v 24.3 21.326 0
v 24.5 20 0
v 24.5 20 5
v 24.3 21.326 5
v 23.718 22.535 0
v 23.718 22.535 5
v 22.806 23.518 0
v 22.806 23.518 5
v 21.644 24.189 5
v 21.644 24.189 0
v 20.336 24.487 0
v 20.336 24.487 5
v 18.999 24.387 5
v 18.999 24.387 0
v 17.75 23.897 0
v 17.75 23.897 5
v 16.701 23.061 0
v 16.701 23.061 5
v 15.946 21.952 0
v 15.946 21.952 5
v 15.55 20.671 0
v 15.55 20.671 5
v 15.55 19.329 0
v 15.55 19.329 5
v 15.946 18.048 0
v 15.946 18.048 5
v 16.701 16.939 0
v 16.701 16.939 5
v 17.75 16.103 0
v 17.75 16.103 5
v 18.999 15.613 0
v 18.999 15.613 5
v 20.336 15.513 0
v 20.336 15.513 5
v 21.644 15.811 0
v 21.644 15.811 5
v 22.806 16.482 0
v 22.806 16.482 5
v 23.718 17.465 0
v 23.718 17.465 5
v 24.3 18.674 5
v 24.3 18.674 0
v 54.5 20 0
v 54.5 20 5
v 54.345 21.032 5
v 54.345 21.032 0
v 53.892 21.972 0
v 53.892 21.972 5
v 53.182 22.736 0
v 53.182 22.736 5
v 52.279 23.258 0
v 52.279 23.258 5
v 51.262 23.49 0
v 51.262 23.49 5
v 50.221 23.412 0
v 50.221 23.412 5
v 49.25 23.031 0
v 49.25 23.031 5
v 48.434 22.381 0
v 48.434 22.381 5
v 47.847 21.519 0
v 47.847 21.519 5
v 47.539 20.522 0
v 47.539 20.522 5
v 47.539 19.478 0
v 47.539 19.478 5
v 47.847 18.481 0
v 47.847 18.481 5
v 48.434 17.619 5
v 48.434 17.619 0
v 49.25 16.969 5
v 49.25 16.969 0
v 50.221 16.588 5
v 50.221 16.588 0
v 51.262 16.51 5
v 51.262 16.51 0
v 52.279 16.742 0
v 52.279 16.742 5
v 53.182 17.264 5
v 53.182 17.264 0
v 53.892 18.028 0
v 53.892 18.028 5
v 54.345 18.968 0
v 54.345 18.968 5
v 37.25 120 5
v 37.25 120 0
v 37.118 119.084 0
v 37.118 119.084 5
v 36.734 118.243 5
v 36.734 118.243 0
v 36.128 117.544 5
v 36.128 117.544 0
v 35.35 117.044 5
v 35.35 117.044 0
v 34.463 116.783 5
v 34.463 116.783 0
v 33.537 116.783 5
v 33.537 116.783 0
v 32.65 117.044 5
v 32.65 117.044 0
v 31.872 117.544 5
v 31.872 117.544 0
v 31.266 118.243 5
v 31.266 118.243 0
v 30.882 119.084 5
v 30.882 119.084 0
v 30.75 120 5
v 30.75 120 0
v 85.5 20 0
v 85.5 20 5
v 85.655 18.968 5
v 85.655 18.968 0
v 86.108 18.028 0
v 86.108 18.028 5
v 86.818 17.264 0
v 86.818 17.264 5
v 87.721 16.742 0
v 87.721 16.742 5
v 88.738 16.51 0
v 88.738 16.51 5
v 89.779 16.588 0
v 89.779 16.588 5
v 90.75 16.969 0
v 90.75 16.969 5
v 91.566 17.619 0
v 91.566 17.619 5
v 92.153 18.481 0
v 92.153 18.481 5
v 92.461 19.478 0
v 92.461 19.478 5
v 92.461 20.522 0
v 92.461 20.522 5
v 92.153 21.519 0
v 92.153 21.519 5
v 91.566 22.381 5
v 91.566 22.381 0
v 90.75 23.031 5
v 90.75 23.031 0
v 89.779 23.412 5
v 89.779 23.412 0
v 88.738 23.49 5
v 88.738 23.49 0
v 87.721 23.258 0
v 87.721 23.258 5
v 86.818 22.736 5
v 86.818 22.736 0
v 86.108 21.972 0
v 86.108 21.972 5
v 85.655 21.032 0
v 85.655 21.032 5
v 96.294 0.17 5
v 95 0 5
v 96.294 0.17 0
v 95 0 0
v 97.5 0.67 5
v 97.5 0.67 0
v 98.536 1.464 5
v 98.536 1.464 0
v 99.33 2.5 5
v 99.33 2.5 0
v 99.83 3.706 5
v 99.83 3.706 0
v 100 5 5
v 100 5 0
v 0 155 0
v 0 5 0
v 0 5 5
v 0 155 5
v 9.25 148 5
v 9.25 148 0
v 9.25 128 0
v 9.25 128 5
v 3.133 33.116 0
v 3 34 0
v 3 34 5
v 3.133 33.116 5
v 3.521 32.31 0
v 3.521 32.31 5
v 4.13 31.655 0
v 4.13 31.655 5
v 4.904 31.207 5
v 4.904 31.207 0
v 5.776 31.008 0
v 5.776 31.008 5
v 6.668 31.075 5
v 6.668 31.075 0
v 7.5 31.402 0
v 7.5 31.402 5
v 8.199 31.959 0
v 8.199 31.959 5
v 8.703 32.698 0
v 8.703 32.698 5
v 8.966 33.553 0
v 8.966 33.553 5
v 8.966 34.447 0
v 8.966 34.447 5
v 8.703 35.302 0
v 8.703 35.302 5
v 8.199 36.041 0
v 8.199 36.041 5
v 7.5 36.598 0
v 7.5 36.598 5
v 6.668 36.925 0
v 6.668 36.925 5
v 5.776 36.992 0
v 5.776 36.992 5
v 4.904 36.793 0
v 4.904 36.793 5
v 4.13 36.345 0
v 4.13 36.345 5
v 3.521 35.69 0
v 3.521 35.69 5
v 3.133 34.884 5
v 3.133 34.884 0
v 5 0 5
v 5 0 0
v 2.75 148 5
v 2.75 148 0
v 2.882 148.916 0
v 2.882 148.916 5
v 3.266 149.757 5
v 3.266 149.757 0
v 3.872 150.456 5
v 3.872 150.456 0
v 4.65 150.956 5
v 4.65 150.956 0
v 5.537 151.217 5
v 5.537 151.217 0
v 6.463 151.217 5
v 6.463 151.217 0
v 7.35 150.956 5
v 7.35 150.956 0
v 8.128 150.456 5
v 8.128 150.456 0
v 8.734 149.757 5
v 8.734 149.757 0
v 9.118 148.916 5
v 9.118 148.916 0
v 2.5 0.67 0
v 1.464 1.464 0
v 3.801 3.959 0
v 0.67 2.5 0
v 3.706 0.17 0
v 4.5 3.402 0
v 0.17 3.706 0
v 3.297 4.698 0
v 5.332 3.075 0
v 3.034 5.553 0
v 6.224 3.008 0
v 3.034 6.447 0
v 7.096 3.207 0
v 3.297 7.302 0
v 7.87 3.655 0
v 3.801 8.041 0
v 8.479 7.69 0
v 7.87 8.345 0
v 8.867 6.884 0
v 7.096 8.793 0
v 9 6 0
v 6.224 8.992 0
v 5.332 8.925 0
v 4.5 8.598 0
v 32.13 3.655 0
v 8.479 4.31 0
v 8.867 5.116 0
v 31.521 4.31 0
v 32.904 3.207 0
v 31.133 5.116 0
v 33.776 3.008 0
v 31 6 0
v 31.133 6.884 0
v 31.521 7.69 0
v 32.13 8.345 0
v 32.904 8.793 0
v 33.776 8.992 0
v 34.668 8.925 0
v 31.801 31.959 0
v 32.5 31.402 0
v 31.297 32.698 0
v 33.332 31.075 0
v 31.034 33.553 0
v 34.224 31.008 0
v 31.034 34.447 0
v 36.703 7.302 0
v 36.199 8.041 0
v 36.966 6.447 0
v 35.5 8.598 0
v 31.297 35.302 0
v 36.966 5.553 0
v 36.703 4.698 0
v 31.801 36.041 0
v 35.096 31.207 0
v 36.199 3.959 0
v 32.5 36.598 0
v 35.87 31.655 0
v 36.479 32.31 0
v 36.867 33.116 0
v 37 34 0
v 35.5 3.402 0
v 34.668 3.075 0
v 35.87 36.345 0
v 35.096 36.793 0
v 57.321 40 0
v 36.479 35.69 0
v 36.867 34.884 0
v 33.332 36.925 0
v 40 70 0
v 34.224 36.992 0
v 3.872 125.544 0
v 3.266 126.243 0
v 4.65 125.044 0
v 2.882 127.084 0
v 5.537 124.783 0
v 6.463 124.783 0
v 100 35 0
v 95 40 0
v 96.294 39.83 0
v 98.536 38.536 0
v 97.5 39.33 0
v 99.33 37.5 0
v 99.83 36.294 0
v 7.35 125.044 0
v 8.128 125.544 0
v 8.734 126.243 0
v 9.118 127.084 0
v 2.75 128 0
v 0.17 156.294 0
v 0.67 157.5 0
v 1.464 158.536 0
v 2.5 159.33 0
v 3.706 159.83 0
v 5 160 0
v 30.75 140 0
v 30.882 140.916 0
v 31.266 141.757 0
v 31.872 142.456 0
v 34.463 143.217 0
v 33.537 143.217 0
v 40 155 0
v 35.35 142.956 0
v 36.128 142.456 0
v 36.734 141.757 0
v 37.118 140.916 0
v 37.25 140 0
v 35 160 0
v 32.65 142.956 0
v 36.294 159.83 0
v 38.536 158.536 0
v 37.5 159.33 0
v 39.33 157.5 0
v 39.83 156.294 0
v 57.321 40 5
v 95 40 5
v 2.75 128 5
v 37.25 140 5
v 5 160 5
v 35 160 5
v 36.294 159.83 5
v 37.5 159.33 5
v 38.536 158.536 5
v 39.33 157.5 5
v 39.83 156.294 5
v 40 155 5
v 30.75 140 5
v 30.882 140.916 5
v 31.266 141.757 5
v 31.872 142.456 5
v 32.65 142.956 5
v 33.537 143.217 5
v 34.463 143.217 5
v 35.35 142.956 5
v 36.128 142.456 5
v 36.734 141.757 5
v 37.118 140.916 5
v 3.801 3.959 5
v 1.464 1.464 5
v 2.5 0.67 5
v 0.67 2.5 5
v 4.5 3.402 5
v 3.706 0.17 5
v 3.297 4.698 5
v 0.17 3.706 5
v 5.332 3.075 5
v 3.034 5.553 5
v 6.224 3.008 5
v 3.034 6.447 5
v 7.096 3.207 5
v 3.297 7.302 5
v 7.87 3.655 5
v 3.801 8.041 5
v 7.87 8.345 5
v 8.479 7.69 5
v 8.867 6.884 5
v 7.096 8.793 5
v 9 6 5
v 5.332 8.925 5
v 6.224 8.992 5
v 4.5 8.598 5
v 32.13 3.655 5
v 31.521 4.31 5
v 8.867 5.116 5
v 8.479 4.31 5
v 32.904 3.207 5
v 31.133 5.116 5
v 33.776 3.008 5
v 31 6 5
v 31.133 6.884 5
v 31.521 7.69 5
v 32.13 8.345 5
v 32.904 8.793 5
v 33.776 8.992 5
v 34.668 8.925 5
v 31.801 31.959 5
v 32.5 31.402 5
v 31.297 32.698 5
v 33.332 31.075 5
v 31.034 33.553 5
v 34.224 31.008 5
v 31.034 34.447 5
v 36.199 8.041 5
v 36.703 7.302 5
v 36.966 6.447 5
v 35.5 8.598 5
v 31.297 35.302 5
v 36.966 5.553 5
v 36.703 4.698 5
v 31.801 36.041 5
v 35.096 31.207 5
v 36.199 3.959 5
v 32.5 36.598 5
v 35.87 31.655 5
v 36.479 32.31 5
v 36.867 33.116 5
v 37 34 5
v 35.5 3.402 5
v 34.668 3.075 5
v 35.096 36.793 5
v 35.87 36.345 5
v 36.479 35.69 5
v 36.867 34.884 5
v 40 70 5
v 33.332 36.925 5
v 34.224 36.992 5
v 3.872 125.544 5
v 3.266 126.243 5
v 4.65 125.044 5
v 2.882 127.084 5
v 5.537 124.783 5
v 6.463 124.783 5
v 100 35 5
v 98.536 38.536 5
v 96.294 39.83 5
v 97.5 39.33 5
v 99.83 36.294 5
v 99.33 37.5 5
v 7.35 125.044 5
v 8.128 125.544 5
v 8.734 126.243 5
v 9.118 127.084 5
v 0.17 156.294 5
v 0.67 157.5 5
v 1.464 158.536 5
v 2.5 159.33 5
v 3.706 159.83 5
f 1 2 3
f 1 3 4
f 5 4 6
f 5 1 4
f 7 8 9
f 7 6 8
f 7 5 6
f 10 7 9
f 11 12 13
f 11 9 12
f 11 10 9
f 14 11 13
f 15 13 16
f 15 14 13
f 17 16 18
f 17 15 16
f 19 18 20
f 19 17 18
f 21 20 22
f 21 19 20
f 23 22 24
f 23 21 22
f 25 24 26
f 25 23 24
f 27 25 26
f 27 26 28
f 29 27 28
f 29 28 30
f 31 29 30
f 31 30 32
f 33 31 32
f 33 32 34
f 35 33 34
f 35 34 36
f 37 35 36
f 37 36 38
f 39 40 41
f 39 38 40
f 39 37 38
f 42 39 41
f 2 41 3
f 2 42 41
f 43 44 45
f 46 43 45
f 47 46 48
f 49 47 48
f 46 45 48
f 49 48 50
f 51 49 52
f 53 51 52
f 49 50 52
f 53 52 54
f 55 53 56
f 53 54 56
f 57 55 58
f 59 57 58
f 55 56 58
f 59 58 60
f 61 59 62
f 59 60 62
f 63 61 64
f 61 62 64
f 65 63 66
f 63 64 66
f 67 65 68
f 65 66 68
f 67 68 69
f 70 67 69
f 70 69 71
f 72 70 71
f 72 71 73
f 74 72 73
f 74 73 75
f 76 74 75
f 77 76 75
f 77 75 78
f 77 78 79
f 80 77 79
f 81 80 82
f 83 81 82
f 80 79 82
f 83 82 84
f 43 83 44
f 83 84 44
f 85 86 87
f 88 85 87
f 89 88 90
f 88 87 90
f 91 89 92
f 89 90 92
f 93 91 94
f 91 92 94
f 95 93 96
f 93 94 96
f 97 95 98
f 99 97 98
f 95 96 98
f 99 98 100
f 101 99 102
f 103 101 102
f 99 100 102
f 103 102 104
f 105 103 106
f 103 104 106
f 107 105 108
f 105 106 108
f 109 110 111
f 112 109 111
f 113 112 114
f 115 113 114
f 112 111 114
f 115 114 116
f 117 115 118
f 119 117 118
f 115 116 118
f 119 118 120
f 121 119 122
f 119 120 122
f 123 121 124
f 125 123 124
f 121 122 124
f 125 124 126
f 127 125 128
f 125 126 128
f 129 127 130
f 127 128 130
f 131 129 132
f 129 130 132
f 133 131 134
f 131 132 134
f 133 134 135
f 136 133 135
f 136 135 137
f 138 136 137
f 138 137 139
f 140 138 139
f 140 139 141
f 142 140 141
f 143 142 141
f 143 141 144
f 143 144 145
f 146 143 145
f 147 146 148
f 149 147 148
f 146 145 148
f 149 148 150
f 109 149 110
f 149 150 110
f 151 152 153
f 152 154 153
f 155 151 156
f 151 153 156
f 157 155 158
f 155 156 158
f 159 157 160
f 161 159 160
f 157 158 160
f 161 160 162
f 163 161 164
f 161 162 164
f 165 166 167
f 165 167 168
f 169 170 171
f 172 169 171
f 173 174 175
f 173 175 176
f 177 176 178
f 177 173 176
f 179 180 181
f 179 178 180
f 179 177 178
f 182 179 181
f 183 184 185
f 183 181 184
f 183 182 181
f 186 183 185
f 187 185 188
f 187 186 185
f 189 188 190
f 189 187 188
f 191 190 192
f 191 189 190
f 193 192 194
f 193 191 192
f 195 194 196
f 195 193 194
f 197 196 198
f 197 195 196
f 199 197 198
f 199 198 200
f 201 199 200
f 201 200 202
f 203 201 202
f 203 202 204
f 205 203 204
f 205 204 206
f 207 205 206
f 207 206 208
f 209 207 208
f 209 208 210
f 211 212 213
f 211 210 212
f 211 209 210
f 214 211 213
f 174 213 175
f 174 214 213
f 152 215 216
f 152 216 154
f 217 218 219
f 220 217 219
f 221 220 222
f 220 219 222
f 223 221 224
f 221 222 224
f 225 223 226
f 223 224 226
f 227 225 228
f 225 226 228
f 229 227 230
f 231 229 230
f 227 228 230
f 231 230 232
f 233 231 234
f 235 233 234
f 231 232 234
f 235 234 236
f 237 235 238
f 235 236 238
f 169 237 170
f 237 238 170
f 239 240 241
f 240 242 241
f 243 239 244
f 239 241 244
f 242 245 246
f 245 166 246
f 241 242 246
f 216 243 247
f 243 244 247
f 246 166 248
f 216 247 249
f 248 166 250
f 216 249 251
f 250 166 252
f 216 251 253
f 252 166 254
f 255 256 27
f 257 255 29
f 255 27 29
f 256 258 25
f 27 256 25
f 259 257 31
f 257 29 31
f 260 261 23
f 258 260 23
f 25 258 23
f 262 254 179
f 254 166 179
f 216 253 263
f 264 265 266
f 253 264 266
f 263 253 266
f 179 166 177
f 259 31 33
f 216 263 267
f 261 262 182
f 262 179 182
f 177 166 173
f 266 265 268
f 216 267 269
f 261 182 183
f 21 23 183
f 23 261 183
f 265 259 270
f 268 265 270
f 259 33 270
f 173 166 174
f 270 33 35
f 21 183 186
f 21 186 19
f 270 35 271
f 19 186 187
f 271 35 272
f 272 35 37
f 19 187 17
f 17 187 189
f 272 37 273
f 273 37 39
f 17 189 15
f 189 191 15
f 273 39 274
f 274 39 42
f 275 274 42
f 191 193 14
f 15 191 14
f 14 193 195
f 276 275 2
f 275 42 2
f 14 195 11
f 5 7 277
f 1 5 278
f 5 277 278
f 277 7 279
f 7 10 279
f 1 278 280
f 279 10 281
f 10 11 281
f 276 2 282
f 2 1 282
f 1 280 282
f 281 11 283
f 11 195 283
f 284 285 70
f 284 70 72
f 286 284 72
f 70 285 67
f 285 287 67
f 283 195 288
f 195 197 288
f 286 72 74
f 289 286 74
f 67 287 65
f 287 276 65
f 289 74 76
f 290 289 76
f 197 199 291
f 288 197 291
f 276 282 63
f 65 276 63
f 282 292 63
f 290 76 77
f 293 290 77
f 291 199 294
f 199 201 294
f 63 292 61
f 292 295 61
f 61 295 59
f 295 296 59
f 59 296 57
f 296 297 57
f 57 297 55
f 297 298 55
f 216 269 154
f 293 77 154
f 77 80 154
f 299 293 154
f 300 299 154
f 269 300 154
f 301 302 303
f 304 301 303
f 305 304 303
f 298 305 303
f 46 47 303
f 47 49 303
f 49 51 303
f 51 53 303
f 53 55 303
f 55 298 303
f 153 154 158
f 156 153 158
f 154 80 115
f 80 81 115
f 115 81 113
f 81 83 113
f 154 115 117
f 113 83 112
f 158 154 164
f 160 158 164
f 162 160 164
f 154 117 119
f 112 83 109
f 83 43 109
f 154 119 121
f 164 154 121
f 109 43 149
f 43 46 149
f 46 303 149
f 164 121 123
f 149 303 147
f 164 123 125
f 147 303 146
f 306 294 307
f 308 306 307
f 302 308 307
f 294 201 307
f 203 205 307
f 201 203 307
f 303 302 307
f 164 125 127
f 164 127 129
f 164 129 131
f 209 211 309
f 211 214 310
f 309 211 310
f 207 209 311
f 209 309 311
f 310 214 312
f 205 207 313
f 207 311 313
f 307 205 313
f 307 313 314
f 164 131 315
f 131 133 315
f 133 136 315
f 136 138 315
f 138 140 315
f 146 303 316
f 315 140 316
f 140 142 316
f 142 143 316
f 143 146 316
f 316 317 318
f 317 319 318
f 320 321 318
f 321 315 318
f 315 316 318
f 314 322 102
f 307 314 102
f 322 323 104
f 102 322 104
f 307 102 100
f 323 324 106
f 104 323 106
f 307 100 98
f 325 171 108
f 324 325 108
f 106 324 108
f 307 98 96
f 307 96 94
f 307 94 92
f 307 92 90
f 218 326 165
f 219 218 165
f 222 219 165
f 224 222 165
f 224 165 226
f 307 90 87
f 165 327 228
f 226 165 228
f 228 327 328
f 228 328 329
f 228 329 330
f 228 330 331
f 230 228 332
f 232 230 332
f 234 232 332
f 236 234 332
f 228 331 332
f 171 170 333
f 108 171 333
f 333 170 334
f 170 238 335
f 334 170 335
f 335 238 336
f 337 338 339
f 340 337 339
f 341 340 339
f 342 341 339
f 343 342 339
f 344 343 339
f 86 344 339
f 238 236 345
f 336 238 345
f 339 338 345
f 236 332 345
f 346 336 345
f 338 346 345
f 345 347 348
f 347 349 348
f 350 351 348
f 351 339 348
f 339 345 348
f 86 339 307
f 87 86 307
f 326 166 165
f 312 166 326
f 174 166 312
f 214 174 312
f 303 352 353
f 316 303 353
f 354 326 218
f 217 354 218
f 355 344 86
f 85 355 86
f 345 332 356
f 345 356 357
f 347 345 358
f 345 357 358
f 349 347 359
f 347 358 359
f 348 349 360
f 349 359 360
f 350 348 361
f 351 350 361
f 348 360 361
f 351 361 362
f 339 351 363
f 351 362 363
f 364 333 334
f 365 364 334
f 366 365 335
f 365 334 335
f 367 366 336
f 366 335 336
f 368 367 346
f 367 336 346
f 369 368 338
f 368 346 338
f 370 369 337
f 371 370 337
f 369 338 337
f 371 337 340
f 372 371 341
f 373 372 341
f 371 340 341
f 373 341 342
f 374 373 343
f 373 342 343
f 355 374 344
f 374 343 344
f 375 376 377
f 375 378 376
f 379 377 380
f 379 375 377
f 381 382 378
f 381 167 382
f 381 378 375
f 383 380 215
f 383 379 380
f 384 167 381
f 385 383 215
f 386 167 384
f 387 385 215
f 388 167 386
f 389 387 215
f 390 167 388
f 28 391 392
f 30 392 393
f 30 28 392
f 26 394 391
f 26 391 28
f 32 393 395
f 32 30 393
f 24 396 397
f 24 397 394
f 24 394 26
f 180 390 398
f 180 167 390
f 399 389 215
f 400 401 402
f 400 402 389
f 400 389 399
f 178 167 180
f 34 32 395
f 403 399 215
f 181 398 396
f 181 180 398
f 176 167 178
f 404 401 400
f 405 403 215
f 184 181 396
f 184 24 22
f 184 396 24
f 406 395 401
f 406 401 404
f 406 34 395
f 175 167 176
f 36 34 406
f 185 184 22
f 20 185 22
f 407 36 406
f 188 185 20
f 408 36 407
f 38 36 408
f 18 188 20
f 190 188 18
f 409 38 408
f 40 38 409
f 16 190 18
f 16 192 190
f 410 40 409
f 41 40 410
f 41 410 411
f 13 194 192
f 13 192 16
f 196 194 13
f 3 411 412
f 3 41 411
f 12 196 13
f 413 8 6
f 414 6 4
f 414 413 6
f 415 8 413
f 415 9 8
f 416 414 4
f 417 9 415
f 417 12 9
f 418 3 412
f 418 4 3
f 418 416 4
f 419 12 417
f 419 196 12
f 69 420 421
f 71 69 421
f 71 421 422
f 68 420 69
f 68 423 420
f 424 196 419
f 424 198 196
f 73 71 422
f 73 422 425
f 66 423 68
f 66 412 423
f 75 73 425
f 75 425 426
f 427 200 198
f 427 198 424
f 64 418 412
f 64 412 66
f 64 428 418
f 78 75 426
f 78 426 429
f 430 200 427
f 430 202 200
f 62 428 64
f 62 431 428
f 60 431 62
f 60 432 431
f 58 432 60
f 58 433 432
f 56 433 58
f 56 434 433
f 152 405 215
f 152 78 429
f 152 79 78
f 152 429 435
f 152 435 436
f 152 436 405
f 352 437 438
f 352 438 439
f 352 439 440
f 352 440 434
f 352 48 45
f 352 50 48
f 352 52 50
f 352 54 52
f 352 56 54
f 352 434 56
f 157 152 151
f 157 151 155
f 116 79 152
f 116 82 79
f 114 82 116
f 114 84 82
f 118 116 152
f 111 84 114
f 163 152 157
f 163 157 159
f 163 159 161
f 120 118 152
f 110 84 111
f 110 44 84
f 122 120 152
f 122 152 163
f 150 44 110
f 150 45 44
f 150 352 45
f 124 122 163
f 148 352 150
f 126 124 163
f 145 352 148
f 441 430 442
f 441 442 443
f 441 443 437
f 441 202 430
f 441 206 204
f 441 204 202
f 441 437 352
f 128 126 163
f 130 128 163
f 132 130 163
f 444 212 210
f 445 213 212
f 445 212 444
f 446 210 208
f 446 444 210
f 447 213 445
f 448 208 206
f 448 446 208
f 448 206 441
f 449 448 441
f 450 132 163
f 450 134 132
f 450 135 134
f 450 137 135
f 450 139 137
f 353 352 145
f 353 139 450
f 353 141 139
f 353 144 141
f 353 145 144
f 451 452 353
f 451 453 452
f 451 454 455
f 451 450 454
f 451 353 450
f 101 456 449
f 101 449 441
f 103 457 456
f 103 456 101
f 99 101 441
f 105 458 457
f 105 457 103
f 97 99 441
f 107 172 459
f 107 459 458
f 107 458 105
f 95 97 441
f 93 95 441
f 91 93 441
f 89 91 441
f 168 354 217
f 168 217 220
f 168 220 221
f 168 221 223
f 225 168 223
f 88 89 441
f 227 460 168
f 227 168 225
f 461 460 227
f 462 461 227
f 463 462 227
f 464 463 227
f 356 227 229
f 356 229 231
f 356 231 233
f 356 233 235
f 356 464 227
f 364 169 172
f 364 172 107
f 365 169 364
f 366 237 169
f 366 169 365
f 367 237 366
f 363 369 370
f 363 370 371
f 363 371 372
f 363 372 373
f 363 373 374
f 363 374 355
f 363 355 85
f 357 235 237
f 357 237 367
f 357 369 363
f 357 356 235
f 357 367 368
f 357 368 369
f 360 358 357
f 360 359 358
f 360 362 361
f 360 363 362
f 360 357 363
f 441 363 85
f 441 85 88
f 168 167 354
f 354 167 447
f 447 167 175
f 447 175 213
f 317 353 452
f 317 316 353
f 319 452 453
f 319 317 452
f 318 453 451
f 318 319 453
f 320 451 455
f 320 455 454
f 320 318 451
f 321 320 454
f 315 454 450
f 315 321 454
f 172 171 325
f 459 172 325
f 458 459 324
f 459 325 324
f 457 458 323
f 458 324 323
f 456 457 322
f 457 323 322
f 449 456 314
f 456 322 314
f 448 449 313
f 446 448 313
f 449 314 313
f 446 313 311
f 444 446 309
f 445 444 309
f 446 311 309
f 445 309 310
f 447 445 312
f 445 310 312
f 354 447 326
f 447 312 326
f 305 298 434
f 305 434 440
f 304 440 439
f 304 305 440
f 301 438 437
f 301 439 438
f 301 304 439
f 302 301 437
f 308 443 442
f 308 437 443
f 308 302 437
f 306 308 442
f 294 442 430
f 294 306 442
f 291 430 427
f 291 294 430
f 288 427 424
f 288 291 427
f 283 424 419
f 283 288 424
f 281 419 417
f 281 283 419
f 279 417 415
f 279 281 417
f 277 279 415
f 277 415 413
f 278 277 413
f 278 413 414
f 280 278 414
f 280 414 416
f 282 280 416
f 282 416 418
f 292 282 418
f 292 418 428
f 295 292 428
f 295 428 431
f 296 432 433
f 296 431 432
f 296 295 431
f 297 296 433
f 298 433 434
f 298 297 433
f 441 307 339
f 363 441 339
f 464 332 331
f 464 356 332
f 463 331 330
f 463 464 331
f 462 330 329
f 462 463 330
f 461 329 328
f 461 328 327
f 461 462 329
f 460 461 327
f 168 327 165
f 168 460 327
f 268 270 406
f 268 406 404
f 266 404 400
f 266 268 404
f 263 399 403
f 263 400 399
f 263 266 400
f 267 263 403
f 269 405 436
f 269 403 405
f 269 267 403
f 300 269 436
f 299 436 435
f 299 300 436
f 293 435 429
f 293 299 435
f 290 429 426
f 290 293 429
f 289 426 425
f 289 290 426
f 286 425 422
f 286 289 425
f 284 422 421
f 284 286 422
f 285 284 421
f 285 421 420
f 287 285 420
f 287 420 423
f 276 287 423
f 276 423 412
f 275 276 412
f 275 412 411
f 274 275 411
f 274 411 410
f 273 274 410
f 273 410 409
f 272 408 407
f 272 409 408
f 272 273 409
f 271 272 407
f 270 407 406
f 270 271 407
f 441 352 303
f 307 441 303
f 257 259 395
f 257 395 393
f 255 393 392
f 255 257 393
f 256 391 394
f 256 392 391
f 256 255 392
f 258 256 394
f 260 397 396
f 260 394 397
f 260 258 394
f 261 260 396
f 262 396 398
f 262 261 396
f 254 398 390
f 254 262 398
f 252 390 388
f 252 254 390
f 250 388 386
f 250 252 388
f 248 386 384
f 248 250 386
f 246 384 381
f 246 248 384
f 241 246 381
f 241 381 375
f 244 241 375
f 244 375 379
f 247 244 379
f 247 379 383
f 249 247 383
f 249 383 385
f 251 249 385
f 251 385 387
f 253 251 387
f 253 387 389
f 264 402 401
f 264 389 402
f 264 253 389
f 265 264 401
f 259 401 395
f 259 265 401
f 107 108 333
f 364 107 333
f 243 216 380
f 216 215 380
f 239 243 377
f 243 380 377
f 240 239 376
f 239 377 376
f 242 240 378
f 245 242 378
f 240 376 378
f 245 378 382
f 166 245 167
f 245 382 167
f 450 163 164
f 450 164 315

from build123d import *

# Parameters (mm, degrees)
ESQUISSE1_W                  = 40
ESQUISSE1_H                  = 160
BOSS_EXTRU_1_DEPTH           = 5
ENL_V_MAT_EXTRU_1_DEPTH      = 166
ENL_V_MAT_EXTRU_1_DEPTH_BACK = 166
ESQUISSE2_R                  = 4.5
ESQUISSE2_R_2                = 3
ESQUISSE3_W                  = 60
ESQUISSE3_H                  = 40
ESQUISSE3_R                  = 3.5
BOSS_EXTRU_2_DEPTH           = 5
CONG_1_R                     = 5
CHANFREIN1_SIZE              = 30
CHANFREIN1_SIZE2             = 17.320508076


with BuildPart() as part:
    # Esquisse1 → Boss.-Extru.1 (new body)
    with BuildSketch(Plane.XY):
        with Locations((20, 80)):
            Rectangle(ESQUISSE1_W, ESQUISSE1_H)
    extrude(amount=BOSS_EXTRU_1_DEPTH)

    # Esquisse2 → Enlèv. mat.-Extru.1 (cut, two sides: drawn at the far end of the back side and taken through both)
    with BuildSketch(Plane.XY.offset(5).offset(-ENL_V_MAT_EXTRU_1_DEPTH_BACK)):
        with Locations((20, 20)):
            Circle(ESQUISSE2_R)
        with Locations((6, 6)):
            Circle(ESQUISSE2_R_2)
        with Locations(Location((34, 6, 0), (0, 0, 180))):
            Circle(ESQUISSE2_R_2)
        with Locations((34, 34)):
            Circle(ESQUISSE2_R_2)
        with Locations(Location((6, 34, 0), (0, 0, 180))):
            Circle(ESQUISSE2_R_2)
        with BuildLine():
            Line((9.25, 148), (9.25, 128))
            ThreePointArc((9.25, 128), (6, 124.75), (2.75, 128))
            Line((2.75, 128), (2.75, 148))
            ThreePointArc((2.75, 148), (6, 151.25), (9.25, 148))
        make_face()
        with BuildLine():
            Line((30.75, 120), (30.75, 140))
            ThreePointArc((30.75, 140), (34, 143.25), (37.25, 140))
            Line((37.25, 140), (37.25, 120))
            ThreePointArc((37.25, 120), (34, 116.75), (30.75, 120))
        make_face()
    extrude(amount=ENL_V_MAT_EXTRU_1_DEPTH + ENL_V_MAT_EXTRU_1_DEPTH_BACK, mode=Mode.SUBTRACT)

    # Esquisse3 → Boss.-Extru.2 (add)
    with BuildSketch(Plane.XY.offset(5)):
        with Locations((70, 20)):
            Rectangle(ESQUISSE3_W, ESQUISSE3_H)
        with Locations((51, 20)):
            Circle(ESQUISSE3_R, mode=Mode.SUBTRACT)
        with Locations(Location((89, 20, 0), (0, 0, 180))):
            Circle(ESQUISSE3_R, mode=Mode.SUBTRACT)
    extrude(amount=-BOSS_EXTRU_2_DEPTH)

    # Congé1
    cong_1_edges = [part.edges().sort_by_distance(p)[0] for p in [
        (0, 160, 2.5),
        (40, 160, 2.5),
        (0, 0, 2.5),
        (100, 40, 2.5),
        (100, 0, 2.5),
    ]]
    fillet(cong_1_edges, radius=CONG_1_R)

    # Chanfrein1
    chanfrein1_edges = [part.edges().sort_by_distance(p)[0] for p in [
        (40, 40, 2.5),
    ]]
    chanfrein1_side = [part.faces().sort_by_distance(p)[0] for p in [
        (40, 97.5, 2.5),
    ]]
    chamfer(chanfrein1_edges, length=CHANFREIN1_SIZE, length2=CHANFREIN1_SIZE2, reference=chanfrein1_side[0])


solid = part.part
